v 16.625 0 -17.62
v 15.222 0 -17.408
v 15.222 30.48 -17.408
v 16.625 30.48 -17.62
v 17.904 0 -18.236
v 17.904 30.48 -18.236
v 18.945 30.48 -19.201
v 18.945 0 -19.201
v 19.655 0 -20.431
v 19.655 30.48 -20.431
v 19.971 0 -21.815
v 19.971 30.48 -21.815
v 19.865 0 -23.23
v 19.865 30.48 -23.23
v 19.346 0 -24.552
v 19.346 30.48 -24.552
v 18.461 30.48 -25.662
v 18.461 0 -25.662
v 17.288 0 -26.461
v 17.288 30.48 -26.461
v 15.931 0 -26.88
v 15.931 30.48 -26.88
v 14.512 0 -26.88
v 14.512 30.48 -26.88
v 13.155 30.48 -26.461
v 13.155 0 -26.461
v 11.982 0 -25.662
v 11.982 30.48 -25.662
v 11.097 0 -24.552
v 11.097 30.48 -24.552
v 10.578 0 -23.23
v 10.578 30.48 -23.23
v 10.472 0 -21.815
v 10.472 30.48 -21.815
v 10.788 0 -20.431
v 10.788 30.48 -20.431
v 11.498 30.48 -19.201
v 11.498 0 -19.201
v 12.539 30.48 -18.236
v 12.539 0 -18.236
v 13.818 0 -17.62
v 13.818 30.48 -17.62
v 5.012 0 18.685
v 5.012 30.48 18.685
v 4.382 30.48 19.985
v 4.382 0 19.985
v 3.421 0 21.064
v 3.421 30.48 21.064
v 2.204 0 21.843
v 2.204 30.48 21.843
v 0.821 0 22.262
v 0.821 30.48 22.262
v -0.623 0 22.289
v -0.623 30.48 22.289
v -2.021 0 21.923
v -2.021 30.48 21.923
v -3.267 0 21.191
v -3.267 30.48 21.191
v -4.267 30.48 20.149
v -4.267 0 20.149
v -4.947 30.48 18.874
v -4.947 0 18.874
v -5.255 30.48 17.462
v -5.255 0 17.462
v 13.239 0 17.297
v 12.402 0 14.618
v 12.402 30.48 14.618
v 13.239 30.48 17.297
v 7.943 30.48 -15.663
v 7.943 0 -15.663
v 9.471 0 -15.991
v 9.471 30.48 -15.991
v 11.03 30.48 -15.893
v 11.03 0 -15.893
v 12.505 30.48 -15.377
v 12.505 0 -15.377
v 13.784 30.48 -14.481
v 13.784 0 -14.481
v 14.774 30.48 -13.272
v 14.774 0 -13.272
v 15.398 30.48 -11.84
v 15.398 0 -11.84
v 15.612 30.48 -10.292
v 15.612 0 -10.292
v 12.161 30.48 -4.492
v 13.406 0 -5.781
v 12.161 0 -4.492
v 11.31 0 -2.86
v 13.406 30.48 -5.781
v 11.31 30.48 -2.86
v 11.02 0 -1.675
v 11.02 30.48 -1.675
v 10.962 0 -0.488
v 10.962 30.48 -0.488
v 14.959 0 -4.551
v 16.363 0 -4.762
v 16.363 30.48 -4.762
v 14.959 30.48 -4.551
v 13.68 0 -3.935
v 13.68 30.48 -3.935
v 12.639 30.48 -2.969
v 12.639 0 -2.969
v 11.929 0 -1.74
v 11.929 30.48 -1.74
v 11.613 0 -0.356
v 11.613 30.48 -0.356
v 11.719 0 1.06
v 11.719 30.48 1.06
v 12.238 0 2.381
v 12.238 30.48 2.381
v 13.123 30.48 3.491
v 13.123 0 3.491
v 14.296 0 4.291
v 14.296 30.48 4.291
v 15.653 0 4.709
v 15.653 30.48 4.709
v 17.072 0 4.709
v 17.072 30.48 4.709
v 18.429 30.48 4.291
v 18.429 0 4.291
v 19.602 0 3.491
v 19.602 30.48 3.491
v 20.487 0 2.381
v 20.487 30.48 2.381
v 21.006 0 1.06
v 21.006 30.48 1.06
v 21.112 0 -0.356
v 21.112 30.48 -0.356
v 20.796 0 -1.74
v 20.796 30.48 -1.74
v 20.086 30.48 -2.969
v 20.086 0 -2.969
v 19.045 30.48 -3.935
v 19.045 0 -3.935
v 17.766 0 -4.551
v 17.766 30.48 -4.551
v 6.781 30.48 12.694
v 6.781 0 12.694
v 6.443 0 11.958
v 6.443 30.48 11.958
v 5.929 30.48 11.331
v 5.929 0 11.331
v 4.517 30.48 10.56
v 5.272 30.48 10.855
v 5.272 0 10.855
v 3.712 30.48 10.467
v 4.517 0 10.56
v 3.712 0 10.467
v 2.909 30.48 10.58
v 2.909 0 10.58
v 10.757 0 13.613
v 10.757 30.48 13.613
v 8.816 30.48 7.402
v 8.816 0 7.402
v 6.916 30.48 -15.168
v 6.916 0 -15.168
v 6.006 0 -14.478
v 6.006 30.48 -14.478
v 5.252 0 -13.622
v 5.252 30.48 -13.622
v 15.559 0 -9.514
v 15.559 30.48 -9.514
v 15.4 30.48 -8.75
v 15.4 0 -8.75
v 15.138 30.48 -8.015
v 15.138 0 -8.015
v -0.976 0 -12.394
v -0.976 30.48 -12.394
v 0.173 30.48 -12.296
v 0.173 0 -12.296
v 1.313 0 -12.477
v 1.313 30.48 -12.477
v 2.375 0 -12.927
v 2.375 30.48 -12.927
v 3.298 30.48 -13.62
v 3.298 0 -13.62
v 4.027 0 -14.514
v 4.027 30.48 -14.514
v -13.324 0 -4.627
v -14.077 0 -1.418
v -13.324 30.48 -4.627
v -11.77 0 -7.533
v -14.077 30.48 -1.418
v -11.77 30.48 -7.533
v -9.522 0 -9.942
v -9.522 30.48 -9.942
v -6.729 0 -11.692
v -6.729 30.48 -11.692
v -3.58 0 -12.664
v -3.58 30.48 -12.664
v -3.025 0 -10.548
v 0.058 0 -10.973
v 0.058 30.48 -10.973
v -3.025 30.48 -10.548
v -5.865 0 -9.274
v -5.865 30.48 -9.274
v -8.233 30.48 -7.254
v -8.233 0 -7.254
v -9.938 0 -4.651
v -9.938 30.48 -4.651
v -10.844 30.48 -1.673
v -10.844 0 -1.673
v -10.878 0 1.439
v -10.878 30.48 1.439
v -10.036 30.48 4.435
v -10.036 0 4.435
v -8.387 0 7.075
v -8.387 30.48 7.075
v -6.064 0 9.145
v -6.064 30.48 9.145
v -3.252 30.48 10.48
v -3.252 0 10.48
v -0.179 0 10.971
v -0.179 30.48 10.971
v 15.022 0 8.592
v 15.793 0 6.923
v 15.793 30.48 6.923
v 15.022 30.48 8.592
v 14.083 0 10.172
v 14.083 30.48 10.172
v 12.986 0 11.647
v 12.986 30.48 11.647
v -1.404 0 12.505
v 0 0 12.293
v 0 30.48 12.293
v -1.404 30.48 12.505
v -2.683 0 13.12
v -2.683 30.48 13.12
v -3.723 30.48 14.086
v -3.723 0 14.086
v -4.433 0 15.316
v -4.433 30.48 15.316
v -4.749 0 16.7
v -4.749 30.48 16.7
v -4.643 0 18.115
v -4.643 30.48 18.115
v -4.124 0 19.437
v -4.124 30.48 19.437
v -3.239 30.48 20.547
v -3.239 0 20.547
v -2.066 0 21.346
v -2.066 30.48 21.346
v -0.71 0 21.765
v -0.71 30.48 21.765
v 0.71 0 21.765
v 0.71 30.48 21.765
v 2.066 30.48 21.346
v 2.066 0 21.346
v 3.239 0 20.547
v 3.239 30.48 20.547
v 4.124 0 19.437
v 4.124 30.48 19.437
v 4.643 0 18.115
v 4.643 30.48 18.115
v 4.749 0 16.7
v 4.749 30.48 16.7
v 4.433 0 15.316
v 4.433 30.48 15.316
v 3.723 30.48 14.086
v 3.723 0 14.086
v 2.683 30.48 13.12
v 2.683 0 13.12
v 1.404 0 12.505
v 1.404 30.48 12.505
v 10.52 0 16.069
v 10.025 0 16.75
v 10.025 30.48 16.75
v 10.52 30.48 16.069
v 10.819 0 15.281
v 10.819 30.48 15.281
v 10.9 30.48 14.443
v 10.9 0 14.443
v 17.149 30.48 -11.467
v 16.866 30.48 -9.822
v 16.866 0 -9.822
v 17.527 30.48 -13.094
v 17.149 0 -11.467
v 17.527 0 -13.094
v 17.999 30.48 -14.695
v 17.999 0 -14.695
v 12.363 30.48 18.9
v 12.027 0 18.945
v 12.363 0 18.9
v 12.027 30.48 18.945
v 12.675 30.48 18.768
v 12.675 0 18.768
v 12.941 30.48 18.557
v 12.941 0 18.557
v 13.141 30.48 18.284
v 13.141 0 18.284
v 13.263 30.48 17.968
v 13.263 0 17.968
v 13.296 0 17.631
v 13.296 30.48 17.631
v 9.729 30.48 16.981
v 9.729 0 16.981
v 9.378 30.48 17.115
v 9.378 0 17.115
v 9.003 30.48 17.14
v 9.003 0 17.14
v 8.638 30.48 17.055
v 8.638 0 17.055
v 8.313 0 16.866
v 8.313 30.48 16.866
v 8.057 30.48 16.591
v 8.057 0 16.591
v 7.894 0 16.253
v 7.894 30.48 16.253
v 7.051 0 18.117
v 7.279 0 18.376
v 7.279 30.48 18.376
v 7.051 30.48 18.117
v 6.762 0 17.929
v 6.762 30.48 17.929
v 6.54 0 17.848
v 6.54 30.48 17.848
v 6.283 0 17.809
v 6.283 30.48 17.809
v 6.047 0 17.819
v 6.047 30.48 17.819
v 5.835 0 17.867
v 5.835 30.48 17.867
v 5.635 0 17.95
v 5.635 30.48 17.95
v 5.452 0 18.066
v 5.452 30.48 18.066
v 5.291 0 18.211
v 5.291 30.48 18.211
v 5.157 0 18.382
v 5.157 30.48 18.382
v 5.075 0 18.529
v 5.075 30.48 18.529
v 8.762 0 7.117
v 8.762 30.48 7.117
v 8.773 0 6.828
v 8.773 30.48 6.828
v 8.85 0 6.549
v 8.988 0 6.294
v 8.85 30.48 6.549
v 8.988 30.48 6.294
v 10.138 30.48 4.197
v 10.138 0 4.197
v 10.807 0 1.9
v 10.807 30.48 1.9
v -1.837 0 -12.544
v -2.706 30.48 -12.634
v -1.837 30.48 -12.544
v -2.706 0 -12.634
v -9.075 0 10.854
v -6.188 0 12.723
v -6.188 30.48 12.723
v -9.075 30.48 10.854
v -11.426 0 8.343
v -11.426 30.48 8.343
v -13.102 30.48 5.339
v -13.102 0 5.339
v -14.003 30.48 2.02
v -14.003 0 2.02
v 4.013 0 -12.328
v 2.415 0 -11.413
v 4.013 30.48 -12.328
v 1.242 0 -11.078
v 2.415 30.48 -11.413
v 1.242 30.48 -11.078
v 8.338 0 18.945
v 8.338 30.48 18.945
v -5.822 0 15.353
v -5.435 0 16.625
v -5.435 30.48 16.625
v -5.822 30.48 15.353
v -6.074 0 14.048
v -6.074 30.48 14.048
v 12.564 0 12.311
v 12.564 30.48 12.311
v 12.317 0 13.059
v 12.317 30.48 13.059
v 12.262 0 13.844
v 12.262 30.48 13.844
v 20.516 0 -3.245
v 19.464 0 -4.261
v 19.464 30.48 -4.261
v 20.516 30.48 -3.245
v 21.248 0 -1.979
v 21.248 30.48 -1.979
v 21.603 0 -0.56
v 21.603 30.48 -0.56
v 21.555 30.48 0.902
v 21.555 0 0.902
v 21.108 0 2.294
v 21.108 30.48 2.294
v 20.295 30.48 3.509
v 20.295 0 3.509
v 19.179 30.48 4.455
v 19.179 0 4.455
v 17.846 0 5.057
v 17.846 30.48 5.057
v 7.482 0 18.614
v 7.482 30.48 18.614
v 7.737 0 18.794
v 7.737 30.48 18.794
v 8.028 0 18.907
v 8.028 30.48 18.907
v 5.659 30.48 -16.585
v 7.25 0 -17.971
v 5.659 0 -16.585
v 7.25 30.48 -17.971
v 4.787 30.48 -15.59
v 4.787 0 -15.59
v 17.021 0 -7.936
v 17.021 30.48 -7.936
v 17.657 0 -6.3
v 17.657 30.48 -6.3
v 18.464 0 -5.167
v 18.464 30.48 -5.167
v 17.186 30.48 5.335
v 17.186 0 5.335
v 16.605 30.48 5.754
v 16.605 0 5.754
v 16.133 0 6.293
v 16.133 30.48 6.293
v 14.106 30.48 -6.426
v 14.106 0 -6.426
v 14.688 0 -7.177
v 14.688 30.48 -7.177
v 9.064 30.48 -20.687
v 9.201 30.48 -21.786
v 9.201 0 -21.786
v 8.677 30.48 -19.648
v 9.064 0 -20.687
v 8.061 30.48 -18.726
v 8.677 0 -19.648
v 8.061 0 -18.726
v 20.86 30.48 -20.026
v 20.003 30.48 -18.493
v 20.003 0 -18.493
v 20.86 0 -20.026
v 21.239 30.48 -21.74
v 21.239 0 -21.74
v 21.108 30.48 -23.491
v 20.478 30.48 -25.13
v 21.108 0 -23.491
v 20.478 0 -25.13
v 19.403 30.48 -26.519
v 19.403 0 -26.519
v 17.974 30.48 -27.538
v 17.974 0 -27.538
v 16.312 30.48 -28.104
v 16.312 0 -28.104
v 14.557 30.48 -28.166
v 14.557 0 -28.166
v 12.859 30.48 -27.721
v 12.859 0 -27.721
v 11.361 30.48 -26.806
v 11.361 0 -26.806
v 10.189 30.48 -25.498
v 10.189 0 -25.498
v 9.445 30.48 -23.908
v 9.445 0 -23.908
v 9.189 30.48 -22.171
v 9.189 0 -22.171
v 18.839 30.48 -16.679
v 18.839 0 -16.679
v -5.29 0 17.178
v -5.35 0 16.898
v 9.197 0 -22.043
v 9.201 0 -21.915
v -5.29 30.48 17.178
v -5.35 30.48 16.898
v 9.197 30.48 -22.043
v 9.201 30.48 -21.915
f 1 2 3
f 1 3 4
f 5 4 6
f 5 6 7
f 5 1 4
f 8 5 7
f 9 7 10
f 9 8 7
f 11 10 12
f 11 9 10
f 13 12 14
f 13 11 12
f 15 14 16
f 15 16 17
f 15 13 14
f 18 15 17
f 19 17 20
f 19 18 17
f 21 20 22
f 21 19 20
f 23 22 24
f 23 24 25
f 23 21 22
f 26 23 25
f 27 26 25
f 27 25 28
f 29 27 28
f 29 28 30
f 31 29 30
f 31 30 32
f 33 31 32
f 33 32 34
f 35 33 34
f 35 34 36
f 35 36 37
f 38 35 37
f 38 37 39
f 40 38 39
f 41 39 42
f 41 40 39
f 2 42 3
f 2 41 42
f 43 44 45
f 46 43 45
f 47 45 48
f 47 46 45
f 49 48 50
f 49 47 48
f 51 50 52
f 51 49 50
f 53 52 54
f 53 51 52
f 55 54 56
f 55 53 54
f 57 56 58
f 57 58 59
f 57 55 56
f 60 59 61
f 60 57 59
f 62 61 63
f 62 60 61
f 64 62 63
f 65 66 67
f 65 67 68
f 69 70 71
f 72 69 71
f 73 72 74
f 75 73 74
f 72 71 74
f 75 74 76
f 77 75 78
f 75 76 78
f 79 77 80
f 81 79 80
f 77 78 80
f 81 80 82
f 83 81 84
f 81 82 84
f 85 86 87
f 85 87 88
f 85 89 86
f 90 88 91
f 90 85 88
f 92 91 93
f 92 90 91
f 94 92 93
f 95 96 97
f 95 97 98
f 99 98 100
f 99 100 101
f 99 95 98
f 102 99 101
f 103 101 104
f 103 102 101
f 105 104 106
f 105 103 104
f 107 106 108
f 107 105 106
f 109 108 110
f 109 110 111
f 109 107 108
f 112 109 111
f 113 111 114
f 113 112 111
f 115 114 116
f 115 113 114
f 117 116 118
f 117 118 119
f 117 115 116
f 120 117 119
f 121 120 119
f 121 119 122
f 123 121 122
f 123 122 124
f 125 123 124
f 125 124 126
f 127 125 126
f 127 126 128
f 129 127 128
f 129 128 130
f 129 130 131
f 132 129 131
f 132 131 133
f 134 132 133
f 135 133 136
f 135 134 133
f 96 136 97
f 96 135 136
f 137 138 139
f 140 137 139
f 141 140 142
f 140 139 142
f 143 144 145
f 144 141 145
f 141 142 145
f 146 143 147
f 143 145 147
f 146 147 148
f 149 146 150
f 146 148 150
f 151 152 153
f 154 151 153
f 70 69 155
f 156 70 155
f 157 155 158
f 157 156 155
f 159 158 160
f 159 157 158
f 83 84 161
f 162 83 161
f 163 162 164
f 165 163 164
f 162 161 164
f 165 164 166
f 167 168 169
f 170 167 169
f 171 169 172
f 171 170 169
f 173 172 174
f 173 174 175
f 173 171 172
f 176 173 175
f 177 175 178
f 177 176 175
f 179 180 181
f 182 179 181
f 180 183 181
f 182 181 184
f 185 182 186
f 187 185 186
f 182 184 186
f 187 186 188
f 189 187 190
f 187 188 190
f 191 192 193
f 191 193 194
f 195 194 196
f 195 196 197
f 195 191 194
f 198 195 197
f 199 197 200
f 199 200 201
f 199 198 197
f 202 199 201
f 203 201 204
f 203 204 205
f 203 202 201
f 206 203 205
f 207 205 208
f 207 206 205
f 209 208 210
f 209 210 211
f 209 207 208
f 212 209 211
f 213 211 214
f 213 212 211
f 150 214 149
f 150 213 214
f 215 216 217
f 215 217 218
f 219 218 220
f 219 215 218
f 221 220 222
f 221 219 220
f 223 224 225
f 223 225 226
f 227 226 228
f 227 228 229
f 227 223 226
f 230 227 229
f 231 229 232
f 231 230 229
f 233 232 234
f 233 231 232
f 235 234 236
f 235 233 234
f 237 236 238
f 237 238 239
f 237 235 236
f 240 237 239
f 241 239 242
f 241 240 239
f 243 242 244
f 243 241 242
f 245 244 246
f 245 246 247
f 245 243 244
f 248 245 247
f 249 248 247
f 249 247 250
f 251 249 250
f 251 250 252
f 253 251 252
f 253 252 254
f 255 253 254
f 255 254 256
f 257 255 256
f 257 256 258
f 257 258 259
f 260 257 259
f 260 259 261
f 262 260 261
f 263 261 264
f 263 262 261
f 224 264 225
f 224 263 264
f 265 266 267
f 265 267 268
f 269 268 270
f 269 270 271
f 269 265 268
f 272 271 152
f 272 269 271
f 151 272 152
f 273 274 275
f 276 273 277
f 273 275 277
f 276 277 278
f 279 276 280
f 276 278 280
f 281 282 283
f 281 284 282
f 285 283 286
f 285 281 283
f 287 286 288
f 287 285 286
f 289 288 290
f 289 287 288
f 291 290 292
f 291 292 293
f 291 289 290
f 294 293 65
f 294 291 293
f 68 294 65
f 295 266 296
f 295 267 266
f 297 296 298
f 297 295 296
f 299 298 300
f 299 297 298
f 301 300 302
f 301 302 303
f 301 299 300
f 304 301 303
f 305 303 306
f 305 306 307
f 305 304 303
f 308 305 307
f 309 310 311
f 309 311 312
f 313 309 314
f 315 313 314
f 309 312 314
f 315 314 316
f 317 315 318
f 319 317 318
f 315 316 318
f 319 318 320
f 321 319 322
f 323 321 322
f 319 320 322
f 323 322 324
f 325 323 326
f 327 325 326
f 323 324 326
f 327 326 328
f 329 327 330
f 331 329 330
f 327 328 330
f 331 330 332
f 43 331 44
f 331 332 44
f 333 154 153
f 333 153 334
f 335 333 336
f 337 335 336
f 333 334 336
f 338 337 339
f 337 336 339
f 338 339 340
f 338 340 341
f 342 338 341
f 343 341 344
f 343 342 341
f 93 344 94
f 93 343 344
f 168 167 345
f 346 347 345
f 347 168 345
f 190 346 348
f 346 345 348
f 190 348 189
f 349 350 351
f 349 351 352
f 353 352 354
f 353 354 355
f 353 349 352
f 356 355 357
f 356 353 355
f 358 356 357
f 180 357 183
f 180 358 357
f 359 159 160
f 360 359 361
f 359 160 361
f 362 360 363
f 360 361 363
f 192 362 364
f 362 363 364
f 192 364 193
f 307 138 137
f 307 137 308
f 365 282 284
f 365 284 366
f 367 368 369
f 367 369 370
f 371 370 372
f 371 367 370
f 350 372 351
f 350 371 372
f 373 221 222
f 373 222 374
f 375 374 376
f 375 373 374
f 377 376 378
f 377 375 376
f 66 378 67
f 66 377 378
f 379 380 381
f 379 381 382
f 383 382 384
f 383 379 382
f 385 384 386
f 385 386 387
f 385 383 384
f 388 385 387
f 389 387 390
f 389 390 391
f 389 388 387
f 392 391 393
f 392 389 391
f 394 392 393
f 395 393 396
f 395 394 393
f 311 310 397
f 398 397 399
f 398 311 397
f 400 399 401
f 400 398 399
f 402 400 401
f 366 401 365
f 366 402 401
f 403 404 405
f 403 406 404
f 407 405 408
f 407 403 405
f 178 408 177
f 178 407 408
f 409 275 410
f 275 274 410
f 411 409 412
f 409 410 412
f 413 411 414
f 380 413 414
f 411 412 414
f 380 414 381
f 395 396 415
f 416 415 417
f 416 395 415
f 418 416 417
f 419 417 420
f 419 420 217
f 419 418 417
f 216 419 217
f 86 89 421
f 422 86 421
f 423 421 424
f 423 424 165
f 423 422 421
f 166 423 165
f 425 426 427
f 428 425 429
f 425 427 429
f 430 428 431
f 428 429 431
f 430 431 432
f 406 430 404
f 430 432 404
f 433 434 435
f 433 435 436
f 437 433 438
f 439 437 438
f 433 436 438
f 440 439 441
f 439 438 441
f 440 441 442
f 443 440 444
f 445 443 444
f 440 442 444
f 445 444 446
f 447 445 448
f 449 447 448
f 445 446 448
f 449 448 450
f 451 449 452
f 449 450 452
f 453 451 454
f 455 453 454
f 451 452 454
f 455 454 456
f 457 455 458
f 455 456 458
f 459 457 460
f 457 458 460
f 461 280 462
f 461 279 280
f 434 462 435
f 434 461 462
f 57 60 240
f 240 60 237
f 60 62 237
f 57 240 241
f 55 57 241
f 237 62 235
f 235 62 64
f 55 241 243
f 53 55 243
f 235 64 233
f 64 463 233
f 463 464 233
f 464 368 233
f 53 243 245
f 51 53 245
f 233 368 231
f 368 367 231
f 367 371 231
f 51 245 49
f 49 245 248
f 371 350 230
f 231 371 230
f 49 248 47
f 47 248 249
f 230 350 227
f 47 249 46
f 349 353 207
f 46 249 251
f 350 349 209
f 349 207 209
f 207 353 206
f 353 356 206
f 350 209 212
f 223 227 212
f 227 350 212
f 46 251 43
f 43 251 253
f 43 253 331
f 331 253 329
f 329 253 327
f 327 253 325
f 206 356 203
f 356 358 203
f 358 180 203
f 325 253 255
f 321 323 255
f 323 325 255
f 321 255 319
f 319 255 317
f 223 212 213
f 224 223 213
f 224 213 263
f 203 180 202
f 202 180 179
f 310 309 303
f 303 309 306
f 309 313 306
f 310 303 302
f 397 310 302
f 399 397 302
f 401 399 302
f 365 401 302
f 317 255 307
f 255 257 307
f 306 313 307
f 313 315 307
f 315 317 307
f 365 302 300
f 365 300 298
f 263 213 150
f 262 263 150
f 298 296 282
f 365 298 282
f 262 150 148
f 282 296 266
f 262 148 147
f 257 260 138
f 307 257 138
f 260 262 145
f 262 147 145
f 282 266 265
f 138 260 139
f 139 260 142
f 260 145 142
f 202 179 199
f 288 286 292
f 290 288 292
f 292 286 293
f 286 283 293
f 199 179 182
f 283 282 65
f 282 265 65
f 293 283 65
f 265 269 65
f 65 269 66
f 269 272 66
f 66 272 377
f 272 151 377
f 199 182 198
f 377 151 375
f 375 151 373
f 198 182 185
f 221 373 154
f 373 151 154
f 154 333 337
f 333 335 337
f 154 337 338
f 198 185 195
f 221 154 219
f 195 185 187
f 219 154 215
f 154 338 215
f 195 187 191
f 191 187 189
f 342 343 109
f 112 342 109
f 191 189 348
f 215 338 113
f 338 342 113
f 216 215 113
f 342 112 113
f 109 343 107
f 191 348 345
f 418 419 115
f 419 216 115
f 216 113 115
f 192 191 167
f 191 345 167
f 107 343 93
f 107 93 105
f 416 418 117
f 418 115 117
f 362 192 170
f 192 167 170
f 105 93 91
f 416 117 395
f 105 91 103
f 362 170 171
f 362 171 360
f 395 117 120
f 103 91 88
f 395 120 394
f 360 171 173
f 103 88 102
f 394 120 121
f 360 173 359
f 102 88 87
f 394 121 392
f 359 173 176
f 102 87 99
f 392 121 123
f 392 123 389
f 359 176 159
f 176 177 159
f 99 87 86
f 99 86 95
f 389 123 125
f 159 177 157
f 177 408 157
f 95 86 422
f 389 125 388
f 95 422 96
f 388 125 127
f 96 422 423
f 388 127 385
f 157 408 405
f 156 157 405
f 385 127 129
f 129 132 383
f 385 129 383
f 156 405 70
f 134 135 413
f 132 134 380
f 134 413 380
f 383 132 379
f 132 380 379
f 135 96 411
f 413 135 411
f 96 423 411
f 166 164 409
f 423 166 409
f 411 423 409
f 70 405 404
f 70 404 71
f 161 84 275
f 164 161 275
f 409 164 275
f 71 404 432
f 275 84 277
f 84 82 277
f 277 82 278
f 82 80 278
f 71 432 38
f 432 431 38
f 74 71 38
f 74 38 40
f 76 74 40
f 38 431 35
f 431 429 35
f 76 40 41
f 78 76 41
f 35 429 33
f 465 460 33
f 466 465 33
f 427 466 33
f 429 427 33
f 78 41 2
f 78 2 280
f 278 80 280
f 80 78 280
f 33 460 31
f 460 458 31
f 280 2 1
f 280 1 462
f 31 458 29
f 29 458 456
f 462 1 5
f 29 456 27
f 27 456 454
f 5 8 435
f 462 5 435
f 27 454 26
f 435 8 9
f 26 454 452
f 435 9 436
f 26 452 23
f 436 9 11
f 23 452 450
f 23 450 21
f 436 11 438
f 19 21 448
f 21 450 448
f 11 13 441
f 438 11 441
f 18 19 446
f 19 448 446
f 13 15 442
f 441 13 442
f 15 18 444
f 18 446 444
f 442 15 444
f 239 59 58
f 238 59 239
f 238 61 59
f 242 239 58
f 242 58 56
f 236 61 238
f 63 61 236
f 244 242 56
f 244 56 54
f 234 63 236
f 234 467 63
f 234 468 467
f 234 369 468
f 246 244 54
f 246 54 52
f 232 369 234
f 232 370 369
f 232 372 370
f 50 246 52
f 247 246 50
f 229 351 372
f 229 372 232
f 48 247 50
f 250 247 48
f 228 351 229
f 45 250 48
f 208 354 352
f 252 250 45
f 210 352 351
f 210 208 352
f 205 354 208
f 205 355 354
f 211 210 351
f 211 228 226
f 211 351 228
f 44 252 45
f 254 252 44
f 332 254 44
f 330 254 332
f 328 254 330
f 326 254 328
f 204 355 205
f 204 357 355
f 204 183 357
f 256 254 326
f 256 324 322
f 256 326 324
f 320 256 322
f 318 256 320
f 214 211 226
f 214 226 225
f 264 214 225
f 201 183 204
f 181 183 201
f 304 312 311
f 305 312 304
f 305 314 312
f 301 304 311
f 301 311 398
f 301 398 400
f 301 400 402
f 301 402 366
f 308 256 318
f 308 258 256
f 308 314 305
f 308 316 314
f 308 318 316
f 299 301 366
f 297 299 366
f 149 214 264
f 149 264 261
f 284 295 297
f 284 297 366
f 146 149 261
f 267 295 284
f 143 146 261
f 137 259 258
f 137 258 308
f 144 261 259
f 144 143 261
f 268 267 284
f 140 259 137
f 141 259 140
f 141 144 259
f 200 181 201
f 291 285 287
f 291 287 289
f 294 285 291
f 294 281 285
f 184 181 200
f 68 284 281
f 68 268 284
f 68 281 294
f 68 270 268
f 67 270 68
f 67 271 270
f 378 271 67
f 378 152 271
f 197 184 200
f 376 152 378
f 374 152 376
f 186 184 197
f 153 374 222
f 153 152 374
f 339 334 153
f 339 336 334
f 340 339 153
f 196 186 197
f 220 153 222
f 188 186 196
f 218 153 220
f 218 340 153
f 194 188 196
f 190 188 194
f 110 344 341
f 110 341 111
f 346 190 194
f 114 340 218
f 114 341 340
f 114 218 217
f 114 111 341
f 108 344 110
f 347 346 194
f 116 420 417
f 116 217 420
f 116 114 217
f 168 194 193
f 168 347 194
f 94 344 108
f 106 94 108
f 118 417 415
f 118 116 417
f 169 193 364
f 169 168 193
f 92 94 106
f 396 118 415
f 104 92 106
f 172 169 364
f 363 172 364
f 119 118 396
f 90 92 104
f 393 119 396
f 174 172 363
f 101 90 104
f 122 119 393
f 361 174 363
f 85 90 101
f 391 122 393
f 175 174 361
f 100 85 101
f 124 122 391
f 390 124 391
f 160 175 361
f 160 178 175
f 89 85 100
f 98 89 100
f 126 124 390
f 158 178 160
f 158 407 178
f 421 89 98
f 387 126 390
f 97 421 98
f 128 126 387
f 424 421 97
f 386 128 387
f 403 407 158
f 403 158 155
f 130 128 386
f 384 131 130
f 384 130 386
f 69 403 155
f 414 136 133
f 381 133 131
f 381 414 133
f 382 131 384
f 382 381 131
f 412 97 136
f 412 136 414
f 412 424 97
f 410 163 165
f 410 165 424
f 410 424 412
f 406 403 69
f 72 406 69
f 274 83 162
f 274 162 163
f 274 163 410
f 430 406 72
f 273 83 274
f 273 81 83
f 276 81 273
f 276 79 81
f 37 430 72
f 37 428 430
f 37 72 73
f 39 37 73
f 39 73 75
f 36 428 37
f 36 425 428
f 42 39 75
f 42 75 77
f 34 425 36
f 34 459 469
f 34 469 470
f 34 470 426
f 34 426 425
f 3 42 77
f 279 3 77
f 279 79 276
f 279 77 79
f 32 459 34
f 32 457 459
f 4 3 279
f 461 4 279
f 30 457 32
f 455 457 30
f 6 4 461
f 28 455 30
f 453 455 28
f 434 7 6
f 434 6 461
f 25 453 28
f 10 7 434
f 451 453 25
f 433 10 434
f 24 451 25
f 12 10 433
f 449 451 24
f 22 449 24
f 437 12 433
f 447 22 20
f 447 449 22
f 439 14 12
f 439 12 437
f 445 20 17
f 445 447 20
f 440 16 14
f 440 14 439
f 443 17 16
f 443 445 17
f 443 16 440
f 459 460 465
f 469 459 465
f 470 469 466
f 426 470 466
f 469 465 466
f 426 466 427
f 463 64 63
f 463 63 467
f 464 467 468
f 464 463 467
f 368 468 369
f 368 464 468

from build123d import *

# Parameters (mm, degrees)
SKETCH1_R               = 4.7625
BOSS_EXTRUDE2_DEPTH     = 30.48
FILLET1_R               = 3.175
FILLET3_R               = 1.27
FILLET4_R               = 3.175
FILLET5_R               = 1.27
FILLET6_R               = 1.27
BOSS_EXTRUDE9_START     = -30.48
BOSS_EXTRUDE9_DEPTH     = 30.48
CUT_EXTRUDE6_START      = -30.48
CUT_EXTRUDE6_DEPTH      = 30.48
FILLET9_R               = 6.35
CUT_EXTRUDE7_DEPTH      = 44.536935081
CUT_EXTRUDE7_DEPTH_BACK = 44.536935081
BOSS_EXTRUDE11_START    = -30.48
SKETCH4_R               = 4.7625
BOSS_EXTRUDE11_DEPTH    = 30.48
FILLET10_R              = 12.7
FILLET11_R              = 12.7


with BuildPart() as part:
    # Sketch1 → Boss-Extrude2 (new body)
    with BuildSketch(Plane(origin=(0, 0, 0), x_dir=(1, 0, 0), z_dir=(0, 1, 0))):
        with BuildLine():
            Line((11.860213807, -12.884548704), (13.754545104, -18.945407466))
            Line((13.754545104, -18.945407466), (7.404545104, -18.945407466))
            Line((7.404545104, -18.945407466), (6.640447212, -16.500698134))
            ThreePointArc((6.640447212, -16.500698134), (5.961240353, -16.792309403), (5.2705, -17.055438375))
            ThreePointArc((5.2705, -17.055438375), (0, -22.325938375), (-5.2705, -17.055438375))
            ThreePointArc((-5.2705, -17.055438375), (-5.919586773, -14.929400926), (-6.188032569, -12.722755117))
            ThreePointArc((-6.188032569, -12.722755117), (-14.1478, 0), (-6.188032569, 12.722755117))
            ThreePointArc((-6.188032569, 12.722755117), (-5.919586773, 14.929400926), (-5.2705, 17.055438375))
            ThreePointArc((-5.2705, 17.055438375), (0, 22.325938375), (5.2705, 17.055438375))
            ThreePointArc((5.2705, 17.055438375), (12.040379738, 12.314885712), (16.362502035, 5.2705))
            ThreePointArc((16.362502035, 5.2705), (21.633002035, 0), (16.362502035, -5.2705))
            ThreePointArc((16.362502035, -5.2705), (14.592418813, -9.361982053), (11.860213807, -12.884548704))
        make_face()
        with Locations(Location((0, 17.055438375, 0), (0, 0, 90))):
            Circle(SKETCH1_R, mode=Mode.SUBTRACT)
        with Locations(Location((16.362502035, 0, 0), (0, 0, 90))):
            Circle(SKETCH1_R, mode=Mode.SUBTRACT)
        with Locations(Location((0, -17.055438375, 0), (0, 0, 90))):
            Circle(SKETCH1_R, mode=Mode.SUBTRACT)
        with BuildLine():
            Line((5.737156066, -9.353468881), (8.338191551, -17.675407466))
            Line((8.338191551, -17.675407466), (12.027017511, -17.675407466))
            Line((12.027017511, -17.675407466), (8.623309815, -6.785342119))
            ThreePointArc((8.623309815, -6.785342119), (-7.294145861, 8.197424961), (5.737156066, -9.353468881))
        make_face(mode=Mode.SUBTRACT)
    extrude(amount=BOSS_EXTRUDE2_DEPTH)

    # Fillet1
    # the kernel refuses this fillet: 3.175 mm, written as the material it adds along each edge
    with BuildSketch(Plane(origin=(-6.188032569, 0, -12.722755117), x_dir=(-0.8747186698844794, 0, 0.4846310437389738), z_dir=(0, 1, 0))) as fillet1_piece_1:
        with BuildLine():
            CenterArc((1.675106808, -3.170499128), FILLET1_R, 93.05116293, 49.316383357)
            ThreePointArc((-0.839315123, -1.231863693), (-0.401568779, -0.628256415), (0, 0))
            ThreePointArc((0, 0), (0.753054473, -0.020055884), (1.506108946, 0))
        make_face()
    extrude(amount=30.48)
    with BuildSketch(Plane(origin=(-5.2705, 0, -17.055438375), x_dir=(-0.35770128840140486, 0, 0.9338360607065755), z_dir=(0, 1, 0))) as fillet1_piece_2:
        with BuildLine():
            CenterArc((0.51828136, -3.174477714), FILLET1_R, 91.039263795, 15.495369937)
            ThreePointArc((-0.385307362, -0.130770695), (-0.191391238, -0.069105054), (0, 0))
            ThreePointArc((0, 0), (0.230347271, -0.002089143), (0.460694542, 0))
        make_face()
    extrude(amount=30.48)
    with BuildSketch(Plane(origin=(5.2705, 0, -17.055438375), x_dir=(-0.12720688847868244, 0, -0.9918762057452392), z_dir=(0, 1, 0))) as fillet1_piece_3:
        with BuildLine():
            CenterArc((1.744769682, -3.149206953), FILLET1_R, 97.308218729, 47.663807195)
            ThreePointArc((-0.855148612, -1.326832167), (-0.414685297, -0.671723102), (0, 0))
            ThreePointArc((0, 0), (0.670443906, -0.042816458), (1.340887811, 0))
        make_face()
    extrude(amount=30.48)
    with BuildSketch(Plane(origin=(16.362502035, 0, -5.2705), x_dir=(-0.3771647323765371, 0, -0.9261461896759794), z_dir=(0, 1, 0))) as fillet1_piece_4:
        with BuildLine():
            CenterArc((1.804499427, -3.172306197), FILLET1_R, 92.360366346, 49.97819677)
            ThreePointArc((-0.70894152, -1.232399084), (-0.312723775, -0.640214629), (0, 0))
            ThreePointArc((0, 0), (0.8368693, -0.017240341), (1.673738599, 0))
        make_face()
    extrude(amount=30.48)
    with BuildSketch(Plane(origin=(16.362502035, 0, 5.2705), x_dir=(0.9898341628287173, 0, -0.14222633404954374), z_dir=(0, 1, 0))) as fillet1_piece_5:
        with BuildLine():
            CenterArc((1.950776398, -3.142723467), FILLET1_R, 98.176695151, 51.81827723)
            ThreePointArc((-0.798714948, -1.554982197), (-0.380235314, -0.787313176), (0, 0))
            ThreePointArc((0, 0), (0.749603894, -0.053579045), (1.499207787, 0))
        make_face()
    extrude(amount=30.48)
    with BuildSketch(Plane(origin=(11.860213807, 0, 12.884548704), x_dir=(0.29831988928740816, 0, 0.9544659468286695), z_dir=(0, 1, 0))) as fillet1_piece_6:
        with BuildLine():
            CenterArc((1.816465361, 3.175), FILLET1_R, 213.037149694, 56.962850306)
            ThreePointArc((-0.845191928, 1.444044923), (-0.405599886, 0.731970177), (0, 0))
            Line((0, 0), (1.816465361, 0))
        make_face()
    extrude(amount=30.48)
    with BuildSketch(Plane(origin=(5.2705, 0, 17.055438375), x_dir=(0.9268908474954334, 0, -0.37533099636080863), z_dir=(0, 1, 0))) as fillet1_piece_7:
        with BuildLine():
            CenterArc((1.820147869, -3.156511003), FILLET1_R, 96.186334825, 46.370096176)
            ThreePointArc((-0.700651409, -1.226175281), (-0.30907029, -0.636661485), (0, 0))
            ThreePointArc((0, 0), (0.73900137, -0.015364429), (1.47800274, 0))
        make_face()
    extrude(amount=30.48)
    with BuildSketch(Plane(origin=(-5.2705, 0, 17.055438375), x_dir=(0.038601082712793416, 0, 0.999254700471006), z_dir=(0, 1, 0))) as fillet1_piece_8:
        with BuildLine():
            CenterArc((0.52945245, -3.172633674), FILLET1_R, 92.212228742, 15.495369937)
            ThreePointArc((-0.436253651, -0.148061518), (-0.217455401, -0.076009068), (0, 0))
            ThreePointArc((0, 0), (0.203447006, -0.003928101), (0.406894013, 0))
        make_face()
    extrude(amount=30.48)
    # the kernel refuses this fillet: 3.175 mm, written as the material it takes off along each edge
    with BuildSketch(Plane(origin=(5.737156066, -8.75064331, 9.353468881), x_dir=(0.29831988928740744, 0, 0.9544659468286697), z_dir=(0, 1, 0))) as fillet1_2_piece_1:
        with BuildLine():
            CenterArc((3.500257324, -3.175), FILLET1_R, 90, 88.017608619)
            ThreePointArc((0.327157544, -3.065169276), (0.271751922, -1.521038893), (0, 0))
            Line((0, 0), (3.500257324, 0))
        make_face()
    extrude(amount=47.98128662, mode=Mode.SUBTRACT)

    # Fillet3
    fillet3_edges = [part.edges().sort_by_distance(p)[0] for p in [
        (13.754545104, 15.24, 18.945407466),
        (7.404545104, 15.24, 18.945407466),
    ]]
    fillet(fillet3_edges, radius=FILLET3_R)

    # Fillet4
    # the kernel refuses this fillet: 3.175 mm, written as the material it adds along each edge
    with BuildSketch(Plane(origin=(12.027017511, 0, 17.675407466), x_dir=(-0.29831988928740777, 0, -0.9544659468286695), z_dir=(0, 1, 0))) as fillet4_piece_1:
        with BuildLine():
            CenterArc((4.256556411, 3.175), FILLET4_R, 173.746252409, 96.253747591)
            Line((1.100450152, 3.520858762), (1.037328027, 3.527775938))
            ThreePointArc((1.037328027, 3.527775938), (0.489616488, 1.779372694), (-0.060608588, 0.018943313))
            Line((-0.060608588, 0.018943313), (0, -0.0635))
            Line((0, -0.0635), (4.256556411, -0.0635))
            Line((4.256556411, -0.0635), (4.256556411, 0))
        make_face()
    extrude(amount=30.48)

    # Fillet5
    fillet5_edges = [part.edges().sort_by_distance(p)[0] for p in [
        (8.338191551, 15.24, 17.675407466),
    ]]
    fillet(fillet5_edges, radius=FILLET5_R)

    # Fillet6
    fillet6_edges = [part.edges().sort_by_distance(p)[0] for p in [
        (6.640447212, 15.24, 16.500698134),
        (8.623309815, 15.24, 6.785342119),
    ]]
    fillet(fillet6_edges, radius=FILLET6_R)

    # Sketch2 → Boss-Extrude9 (add)
    with BuildSketch(Plane(origin=(0, 30.48, 0), x_dir=(1, 0, 0), z_dir=(0, 1, 0)).offset(BOSS_EXTRUDE9_START)):
        with BuildLine():
            ThreePointArc((7.943426233, 15.662766674), (13.175324303, 14.973004025), (15.611766116, 10.291948459))
            ThreePointArc((15.611766116, 10.291948459), (15.492196473, 9.129027942), (15.138490831, 8.014768839))
            ThreePointArc((15.138490831, 8.014768839), (15.444654673, 7.422560084), (15.731226864, 6.820626626))
            ThreePointArc((15.731226864, 6.820626626), (15.781158654, 6.716236617), (15.834861283, 6.61373547))
            ThreePointArc((15.834861283, 6.61373547), (16.614943687, 8.379799111), (16.881766116, 10.291948459))
            ThreePointArc((16.881766116, 10.291948459), (13.476256049, 16.290071233), (6.580412696, 16.439470316))
            ThreePointArc((6.580412696, 16.439470316), (6.637545403, 16.407150651), (6.69533405, 16.376019005))
            ThreePointArc((6.69533405, 16.376019005), (7.325689413, 16.030433186), (7.943426233, 15.662766674))
        make_face()
    extrude(amount=BOSS_EXTRUDE9_DEPTH)

    # Sketch2<12> → Cut-Extrude6 (cut)
    with BuildSketch(Plane(origin=(0, 30.48, 0), x_dir=(1, 0, 0), z_dir=(0, 1, 0)).offset(CUT_EXTRUDE6_START)):
        with BuildLine():
            ThreePointArc((15.138490831, 8.014768839), (12.043511127, 12.311557951), (7.943426233, 15.662766674))
            ThreePointArc((7.943426233, 15.662766674), (5.173639716, 13.509603196), (4.183683511, 10.143920944))
            ThreePointArc((4.183683511, 10.143920944), (7.605607592, 7.90930294), (9.972426866, 4.577449316))
            ThreePointArc((9.972426866, 4.577449316), (13.062589614, 5.533925069), (15.138490831, 8.014768839))
        make_face()
    extrude(amount=CUT_EXTRUDE6_DEPTH, mode=Mode.SUBTRACT)

    # Fillet9
    fillet9_edges = [part.edges().sort_by_distance(p)[0] for p in [
        (6.580412696, 15.24, -16.439470316),
        (15.834861283, 15.24, -6.61373547),
        (9.972426866, 15.24, -4.577449316),
        (4.183683511, 15.24, -10.143920944),
    ]]
    fillet(fillet9_edges, radius=FILLET9_R)

    # Sketch3 → Cut-Extrude7 (cut, two sides: drawn at the far end of the back side and taken through both)
    with BuildSketch(Plane(origin=(0, 30.48, 0), x_dir=(1, 0, 0), z_dir=(0, 1, 0)).offset(-CUT_EXTRUDE7_DEPTH_BACK)):
        with BuildLine():
            Line((-7.505454184, 11.992847966), (-2.296148987, 12.883016287))
            ThreePointArc((-2.296148987, 12.883016287), (2.423426985, 12.955632538), (4.7625, 17.055438375))
            Line((4.7625, 17.055438375), (9.734184624, 17.275056095))
            ThreePointArc((9.734184624, 17.275056095), (-1.208436668, 22.214922829), (-7.505454184, 11.992847966))
        make_face()
    extrude(amount=CUT_EXTRUDE7_DEPTH + CUT_EXTRUDE7_DEPTH_BACK, mode=Mode.SUBTRACT)

    # Sketch4 → Boss-Extrude11 (add)
    with BuildSketch(Plane(origin=(0, 30.48, 0), x_dir=(1, 0, 0), z_dir=(0, 1, 0)).offset(BOSS_EXTRUDE11_START)):
        with BuildLine():
            ThreePointArc((16.86594215, 9.822043775), (17.712963238, 13.767422556), (19.105519309, 17.554802394))
            ThreePointArc((19.105519309, 17.554802394), (17.767180424, 27.639662161), (9.18901652, 22.17059903))
            ThreePointArc((9.18901652, 22.17059903), (9.198998035, 21.978650402), (9.201259866, 21.786455734))
            ThreePointArc((9.201259866, 21.786455734), (7.906472539, 18.553470941), (4.7625, 17.055438375))
            Line((4.7625, 17.055438375), (9.734184624, 17.275056095))
            ThreePointArc((9.734184624, 17.275056095), (14.943475982, 15.121124841), (16.86594215, 9.822043775))
        make_face()
        with Locations(Location((15.22151652, 22.17059903, 0), (0, 0, 270))):
            Circle(SKETCH4_R, mode=Mode.SUBTRACT)
    extrude(amount=BOSS_EXTRUDE11_DEPTH)

    # Fillet10
    fillet10_edges = [part.edges().sort_by_distance(p)[0] for p in [
        (4.7625, 15.24, -17.055438375),
        (19.105519309, 15.24, -17.554802394),
        (-7.505454184, 15.24, -11.992847966),
    ]]
    fillet(fillet10_edges, radius=FILLET10_R)

    # Fillet11
    # the kernel refuses this fillet: 12.7 mm, written as the material it takes off along each edge
    with BuildSketch(Plane(origin=(-2.296148987, -3.519120011, -12.883016287), x_dir=(0.9377307104980771, 0, 0.3473630875449655), z_dir=(0, 1, 0))) as fillet11_piece_1:
        with BuildLine():
            CenterArc((3.28451201, -12.560548615), FILLET11_R, 98.498560753, 11.829576247)
            Line((-1.127419619, -0.651524335), (-1.215658252, -0.413343849))
            ThreePointArc((-1.215658252, -0.413343849), (-0.690798794, -0.105843114), (-0.127088985, 0.219919053))
            Line((-0.127088985, 0.219919053), (0.03753728, 0.251210972))
            ThreePointArc((0.03753728, 0.251210972), (0.703824002, 0.201705731), (1.370110724, 0.251210972))
            Line((1.370110724, 0.251210972), (1.407648004, 0))
        make_face()
    extrude(amount=37.518240022, mode=Mode.SUBTRACT)


solid = part.part
